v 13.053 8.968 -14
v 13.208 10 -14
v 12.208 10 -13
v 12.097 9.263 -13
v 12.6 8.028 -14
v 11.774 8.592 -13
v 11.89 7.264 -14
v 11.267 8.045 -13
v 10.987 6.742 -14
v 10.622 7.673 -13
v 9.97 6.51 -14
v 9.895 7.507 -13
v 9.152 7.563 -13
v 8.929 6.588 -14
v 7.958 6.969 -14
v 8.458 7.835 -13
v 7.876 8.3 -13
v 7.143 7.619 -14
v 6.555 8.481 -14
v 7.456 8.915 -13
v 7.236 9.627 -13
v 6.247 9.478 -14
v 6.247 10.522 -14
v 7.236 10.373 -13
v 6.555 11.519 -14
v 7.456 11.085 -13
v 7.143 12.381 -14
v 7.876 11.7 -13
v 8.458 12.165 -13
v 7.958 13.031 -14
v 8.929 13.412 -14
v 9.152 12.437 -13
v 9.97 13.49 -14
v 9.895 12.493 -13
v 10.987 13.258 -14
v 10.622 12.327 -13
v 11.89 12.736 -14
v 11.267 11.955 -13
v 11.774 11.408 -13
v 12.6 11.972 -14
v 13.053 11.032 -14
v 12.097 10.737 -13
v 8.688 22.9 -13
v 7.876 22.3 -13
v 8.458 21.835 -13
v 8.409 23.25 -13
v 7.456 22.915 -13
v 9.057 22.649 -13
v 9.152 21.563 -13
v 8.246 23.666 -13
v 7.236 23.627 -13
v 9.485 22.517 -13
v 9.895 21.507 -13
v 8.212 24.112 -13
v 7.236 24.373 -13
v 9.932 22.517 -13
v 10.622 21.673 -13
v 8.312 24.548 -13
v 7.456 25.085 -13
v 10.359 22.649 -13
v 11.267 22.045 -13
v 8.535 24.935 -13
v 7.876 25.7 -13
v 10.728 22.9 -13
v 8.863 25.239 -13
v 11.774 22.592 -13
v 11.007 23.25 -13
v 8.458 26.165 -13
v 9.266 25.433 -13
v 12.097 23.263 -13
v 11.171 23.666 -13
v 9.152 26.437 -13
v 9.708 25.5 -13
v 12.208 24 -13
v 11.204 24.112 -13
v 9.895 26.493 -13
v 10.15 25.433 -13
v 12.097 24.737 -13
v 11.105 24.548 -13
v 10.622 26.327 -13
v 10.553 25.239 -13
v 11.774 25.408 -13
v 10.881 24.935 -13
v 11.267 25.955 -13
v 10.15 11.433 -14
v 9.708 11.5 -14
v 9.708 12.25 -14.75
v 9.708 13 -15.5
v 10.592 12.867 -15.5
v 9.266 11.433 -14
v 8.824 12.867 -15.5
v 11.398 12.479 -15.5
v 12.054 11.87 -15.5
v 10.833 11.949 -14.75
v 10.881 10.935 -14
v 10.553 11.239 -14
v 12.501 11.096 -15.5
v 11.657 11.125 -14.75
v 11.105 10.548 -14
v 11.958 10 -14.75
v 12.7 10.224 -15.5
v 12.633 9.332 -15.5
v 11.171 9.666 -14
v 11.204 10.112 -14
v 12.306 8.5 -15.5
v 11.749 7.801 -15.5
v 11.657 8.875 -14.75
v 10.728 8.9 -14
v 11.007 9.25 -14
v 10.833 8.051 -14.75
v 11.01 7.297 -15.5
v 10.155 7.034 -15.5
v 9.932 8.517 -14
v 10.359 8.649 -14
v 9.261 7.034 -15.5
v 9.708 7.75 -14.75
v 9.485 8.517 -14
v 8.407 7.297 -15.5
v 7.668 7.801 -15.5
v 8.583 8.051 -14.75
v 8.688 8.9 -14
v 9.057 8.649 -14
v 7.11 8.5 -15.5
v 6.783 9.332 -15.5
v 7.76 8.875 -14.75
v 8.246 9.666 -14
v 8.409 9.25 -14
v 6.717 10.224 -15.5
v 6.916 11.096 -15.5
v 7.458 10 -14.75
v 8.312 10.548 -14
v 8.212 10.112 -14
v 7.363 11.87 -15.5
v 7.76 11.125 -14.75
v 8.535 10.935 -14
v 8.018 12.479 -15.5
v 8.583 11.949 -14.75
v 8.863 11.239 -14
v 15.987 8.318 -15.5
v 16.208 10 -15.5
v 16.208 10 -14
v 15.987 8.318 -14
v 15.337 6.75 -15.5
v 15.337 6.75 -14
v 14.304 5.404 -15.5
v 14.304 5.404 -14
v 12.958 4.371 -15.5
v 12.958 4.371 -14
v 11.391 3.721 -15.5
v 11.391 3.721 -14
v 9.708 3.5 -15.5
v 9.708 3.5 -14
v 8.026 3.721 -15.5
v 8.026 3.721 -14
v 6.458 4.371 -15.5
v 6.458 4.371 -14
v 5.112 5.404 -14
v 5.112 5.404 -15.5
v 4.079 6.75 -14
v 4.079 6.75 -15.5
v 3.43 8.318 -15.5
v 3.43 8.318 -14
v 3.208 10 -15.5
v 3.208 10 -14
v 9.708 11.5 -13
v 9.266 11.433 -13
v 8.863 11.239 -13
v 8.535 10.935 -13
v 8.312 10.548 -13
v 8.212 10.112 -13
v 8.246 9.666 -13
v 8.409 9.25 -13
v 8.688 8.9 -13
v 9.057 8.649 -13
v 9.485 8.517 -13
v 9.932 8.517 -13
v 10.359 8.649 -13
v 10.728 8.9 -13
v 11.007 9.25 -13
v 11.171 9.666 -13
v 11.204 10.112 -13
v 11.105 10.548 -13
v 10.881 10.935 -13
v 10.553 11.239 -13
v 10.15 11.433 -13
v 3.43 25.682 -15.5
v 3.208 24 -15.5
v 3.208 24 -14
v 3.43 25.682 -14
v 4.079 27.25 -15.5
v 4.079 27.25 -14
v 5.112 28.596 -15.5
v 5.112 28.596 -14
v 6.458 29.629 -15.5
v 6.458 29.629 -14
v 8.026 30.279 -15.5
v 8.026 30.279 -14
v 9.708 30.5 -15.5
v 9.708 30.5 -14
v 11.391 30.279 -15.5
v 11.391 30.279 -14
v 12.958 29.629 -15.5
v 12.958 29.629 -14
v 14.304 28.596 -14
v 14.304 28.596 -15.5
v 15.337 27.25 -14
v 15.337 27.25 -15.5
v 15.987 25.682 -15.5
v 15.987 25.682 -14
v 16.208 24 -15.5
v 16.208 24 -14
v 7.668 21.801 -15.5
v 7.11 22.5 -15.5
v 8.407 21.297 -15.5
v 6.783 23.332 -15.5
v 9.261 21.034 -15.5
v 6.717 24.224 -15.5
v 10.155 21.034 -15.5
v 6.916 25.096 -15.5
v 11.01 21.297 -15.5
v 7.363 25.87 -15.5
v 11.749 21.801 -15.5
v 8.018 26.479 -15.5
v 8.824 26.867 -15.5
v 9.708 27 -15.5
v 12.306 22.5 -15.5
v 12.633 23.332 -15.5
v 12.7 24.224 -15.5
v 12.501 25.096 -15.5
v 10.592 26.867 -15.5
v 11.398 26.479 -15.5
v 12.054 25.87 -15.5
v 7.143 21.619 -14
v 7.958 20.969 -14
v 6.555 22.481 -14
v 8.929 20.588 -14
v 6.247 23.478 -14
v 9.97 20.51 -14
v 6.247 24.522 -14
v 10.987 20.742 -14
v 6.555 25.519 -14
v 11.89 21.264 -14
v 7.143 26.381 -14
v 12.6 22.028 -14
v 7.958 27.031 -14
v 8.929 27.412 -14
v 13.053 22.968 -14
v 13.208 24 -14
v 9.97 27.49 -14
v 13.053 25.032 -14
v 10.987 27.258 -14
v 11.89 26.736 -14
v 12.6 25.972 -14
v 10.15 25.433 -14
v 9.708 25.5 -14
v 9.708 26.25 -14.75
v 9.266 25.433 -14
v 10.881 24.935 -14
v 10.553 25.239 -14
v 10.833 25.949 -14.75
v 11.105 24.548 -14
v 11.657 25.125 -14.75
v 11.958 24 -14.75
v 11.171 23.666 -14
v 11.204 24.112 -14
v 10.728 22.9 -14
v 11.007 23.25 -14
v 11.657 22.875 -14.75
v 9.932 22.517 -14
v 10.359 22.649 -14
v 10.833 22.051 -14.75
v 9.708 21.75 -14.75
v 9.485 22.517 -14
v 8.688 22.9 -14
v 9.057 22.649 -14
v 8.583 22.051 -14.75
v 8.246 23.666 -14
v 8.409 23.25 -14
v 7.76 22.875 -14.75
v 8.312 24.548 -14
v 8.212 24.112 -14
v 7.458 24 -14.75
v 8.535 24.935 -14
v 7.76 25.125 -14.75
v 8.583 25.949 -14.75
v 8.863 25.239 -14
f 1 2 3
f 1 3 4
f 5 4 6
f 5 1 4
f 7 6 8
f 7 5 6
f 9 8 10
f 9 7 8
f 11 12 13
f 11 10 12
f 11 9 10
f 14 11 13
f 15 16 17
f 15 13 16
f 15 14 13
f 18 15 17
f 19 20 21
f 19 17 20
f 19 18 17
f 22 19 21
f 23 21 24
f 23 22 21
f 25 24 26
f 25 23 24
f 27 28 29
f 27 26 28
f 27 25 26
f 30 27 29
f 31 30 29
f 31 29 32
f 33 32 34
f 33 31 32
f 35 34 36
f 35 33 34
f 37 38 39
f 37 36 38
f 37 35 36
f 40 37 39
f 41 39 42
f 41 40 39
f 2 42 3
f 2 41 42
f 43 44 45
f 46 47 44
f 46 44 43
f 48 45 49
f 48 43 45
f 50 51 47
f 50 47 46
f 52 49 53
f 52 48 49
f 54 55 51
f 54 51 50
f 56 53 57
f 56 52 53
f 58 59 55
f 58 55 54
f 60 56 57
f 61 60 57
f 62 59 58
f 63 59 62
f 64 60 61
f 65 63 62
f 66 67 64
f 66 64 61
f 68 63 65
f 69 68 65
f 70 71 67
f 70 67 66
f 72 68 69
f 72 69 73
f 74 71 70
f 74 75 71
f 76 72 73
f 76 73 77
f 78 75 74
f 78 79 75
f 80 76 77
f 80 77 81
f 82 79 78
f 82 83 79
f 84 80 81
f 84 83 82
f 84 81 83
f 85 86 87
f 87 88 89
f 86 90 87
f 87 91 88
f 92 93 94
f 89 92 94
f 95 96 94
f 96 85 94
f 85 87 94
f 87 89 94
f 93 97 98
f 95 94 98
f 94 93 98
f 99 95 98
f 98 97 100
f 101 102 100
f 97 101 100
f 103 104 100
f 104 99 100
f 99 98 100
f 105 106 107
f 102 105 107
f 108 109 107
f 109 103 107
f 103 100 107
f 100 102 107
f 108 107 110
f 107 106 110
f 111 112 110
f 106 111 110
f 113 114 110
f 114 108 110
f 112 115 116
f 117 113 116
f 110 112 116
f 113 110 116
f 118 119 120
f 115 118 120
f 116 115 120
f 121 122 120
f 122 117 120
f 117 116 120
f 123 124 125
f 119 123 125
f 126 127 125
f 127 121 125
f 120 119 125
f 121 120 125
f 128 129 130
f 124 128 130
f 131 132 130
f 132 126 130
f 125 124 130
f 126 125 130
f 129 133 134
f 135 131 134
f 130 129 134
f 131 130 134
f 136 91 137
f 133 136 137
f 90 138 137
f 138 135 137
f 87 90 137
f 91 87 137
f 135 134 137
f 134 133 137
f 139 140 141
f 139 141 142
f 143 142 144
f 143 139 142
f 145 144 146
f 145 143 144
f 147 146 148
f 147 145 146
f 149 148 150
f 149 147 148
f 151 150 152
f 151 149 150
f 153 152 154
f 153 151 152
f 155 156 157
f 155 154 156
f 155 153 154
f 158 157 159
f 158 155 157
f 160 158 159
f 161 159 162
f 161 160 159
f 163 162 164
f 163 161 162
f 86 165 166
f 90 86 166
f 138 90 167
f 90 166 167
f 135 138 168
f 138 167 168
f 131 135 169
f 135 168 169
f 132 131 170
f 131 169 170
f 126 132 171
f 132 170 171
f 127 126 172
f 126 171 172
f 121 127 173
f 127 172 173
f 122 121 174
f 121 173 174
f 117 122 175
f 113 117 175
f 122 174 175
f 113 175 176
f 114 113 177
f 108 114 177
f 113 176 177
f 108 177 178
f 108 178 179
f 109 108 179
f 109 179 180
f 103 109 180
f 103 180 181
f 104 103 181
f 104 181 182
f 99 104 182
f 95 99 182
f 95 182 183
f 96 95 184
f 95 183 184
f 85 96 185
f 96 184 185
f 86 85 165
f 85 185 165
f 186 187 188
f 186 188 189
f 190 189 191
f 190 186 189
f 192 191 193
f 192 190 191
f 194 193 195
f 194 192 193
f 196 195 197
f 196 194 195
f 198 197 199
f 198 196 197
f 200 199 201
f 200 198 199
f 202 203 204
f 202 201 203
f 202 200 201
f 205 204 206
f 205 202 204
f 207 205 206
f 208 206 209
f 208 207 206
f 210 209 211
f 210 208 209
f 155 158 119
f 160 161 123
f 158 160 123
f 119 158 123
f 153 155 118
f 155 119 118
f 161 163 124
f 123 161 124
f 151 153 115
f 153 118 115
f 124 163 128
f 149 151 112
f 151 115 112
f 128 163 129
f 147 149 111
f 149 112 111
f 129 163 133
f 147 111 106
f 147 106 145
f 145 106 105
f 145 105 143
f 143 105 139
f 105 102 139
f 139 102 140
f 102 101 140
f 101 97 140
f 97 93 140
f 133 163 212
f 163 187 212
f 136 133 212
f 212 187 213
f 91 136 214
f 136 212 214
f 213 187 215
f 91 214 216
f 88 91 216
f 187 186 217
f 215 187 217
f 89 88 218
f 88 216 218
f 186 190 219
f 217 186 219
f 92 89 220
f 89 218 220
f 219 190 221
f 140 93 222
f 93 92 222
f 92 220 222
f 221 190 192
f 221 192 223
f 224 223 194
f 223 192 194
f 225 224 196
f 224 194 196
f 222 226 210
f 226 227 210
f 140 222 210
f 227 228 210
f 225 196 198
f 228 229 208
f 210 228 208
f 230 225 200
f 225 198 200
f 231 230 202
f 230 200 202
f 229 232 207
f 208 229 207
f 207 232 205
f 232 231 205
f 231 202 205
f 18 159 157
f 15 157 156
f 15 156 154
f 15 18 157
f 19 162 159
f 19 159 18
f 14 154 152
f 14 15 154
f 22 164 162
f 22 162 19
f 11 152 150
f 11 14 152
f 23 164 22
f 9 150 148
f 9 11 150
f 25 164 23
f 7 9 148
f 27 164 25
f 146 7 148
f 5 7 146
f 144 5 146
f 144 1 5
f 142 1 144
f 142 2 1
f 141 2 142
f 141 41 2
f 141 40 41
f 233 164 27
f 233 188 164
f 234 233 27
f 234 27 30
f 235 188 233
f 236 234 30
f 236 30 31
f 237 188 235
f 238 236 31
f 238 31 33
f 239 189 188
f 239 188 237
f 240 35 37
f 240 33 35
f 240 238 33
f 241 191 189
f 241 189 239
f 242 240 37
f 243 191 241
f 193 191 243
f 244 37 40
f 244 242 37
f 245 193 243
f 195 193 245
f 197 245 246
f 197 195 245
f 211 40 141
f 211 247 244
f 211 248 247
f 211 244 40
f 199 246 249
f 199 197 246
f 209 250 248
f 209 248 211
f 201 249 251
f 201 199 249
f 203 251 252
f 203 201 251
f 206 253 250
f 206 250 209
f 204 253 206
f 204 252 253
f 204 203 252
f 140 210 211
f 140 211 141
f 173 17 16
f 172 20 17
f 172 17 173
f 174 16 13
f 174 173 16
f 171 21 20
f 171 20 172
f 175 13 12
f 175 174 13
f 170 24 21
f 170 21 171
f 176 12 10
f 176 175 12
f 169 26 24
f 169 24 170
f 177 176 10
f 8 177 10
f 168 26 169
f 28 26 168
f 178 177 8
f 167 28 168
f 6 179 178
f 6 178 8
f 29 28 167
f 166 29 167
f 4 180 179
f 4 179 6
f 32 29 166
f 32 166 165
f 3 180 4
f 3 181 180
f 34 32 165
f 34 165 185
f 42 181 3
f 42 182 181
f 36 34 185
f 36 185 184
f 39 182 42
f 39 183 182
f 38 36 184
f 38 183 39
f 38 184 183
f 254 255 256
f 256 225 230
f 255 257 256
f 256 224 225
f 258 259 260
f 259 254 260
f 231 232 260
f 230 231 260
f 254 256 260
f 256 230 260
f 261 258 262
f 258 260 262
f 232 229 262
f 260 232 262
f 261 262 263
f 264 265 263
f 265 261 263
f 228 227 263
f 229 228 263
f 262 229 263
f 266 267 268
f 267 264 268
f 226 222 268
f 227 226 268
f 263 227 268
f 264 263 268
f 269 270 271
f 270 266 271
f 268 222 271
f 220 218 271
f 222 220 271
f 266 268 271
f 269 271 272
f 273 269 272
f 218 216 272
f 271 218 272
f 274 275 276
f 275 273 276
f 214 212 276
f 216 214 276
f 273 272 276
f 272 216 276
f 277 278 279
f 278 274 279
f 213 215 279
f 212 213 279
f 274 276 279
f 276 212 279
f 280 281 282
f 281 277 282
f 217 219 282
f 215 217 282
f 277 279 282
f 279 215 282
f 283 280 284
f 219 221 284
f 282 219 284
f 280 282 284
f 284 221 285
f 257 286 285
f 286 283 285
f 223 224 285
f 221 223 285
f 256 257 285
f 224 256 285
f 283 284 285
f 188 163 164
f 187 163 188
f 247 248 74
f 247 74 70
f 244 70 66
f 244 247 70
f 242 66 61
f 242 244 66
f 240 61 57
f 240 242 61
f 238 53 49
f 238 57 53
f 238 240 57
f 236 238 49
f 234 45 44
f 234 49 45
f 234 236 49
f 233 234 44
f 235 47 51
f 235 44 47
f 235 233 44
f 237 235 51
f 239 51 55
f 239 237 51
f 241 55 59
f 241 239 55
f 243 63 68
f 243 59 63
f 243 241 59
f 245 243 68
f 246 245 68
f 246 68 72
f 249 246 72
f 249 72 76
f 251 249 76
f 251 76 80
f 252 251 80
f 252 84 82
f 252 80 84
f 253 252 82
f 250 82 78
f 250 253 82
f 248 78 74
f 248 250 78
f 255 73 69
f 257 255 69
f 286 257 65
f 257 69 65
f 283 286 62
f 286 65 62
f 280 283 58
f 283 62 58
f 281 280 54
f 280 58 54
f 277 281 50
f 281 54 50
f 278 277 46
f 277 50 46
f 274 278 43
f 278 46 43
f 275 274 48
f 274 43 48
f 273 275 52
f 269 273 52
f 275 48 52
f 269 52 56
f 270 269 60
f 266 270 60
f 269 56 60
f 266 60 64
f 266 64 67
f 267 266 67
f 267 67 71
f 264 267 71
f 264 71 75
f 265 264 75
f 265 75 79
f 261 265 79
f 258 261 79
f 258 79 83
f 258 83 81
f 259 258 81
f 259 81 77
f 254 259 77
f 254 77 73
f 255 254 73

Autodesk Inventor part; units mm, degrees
ref_plane "YZ Plane" through (0, 0, 0) normal (1, 0, 0) x (0, 1, 0)
ref_plane "XZ Plane" through (0, 0, 0) normal (0, 1, 0) x (-1, 0, 0)
ref_plane "Work Plane1" through (0, 0, -15.5) normal (0, 0, 1) x (1, 0, 0)
sketch "Sketch1" plane through (0, 0, -15.5) normal (0, 0, 1) x (1, 0, 0)
  arc A0 (3.2082, 10) -> (16.2082, 10) centre (9.7082, 10) ccw
  line L0 (16.2082, 24) -> (16.2082, 10)
  line L1 (3.2082, 10) -> (3.2082, 24)
  arc A1 (16.2082, 24) -> (3.2082, 24) centre (9.7082, 24) ccw
extrude "Extrusion3" add sketch "Sketch1" along normal blind 1.5
sketch "Sketch2" plane through (0, 0, -14) normal (0, 0, 1) x (1, 0, 0)
  circle A0 centre (9.7082, 10) radius 2.5
extrude "Extrusion2" add sketch "Sketch2" along normal blind 1
sketch "Sketch3" plane through (0, 0, -14) normal (0, 0, 1) x (1, 0, 0)
  circle A0 centre (9.7082, 24) radius 2.5
extrude "Extrusion1" add sketch "Sketch3" along normal blind 1
hole "Hole2" at (9.7082, 10, -15.5) direction (0, 0, 1) diameter 3 depth 2.5
sketch "Sketch4" plane through (0, 0, -15.5) normal (0, 0, 1) x (1, 0, 0)
  point P0 (9.7082, 10)
hole "Hole1" at (9.7082, 24, -15.5) direction (0, 0, 1) diameter 3 depth 2.5
chamfer "Chamfer1" distance 1.5 angle 45 2 edges at (9.7082, 22.5, -15.5) (9.7082, 8.5, -15.5)
chamfer "Chamfer2" distance 1 angle 45 2 edges at (7.2082, 24, -14) (7.2082, 10, -14)
sketch "Sketch5" plane through (0, 0, -15.5) normal (0, 0, 1) x (1, 0, 0)
  point P0 (9.7082, 24)
properties part number "Belt Retainer"
